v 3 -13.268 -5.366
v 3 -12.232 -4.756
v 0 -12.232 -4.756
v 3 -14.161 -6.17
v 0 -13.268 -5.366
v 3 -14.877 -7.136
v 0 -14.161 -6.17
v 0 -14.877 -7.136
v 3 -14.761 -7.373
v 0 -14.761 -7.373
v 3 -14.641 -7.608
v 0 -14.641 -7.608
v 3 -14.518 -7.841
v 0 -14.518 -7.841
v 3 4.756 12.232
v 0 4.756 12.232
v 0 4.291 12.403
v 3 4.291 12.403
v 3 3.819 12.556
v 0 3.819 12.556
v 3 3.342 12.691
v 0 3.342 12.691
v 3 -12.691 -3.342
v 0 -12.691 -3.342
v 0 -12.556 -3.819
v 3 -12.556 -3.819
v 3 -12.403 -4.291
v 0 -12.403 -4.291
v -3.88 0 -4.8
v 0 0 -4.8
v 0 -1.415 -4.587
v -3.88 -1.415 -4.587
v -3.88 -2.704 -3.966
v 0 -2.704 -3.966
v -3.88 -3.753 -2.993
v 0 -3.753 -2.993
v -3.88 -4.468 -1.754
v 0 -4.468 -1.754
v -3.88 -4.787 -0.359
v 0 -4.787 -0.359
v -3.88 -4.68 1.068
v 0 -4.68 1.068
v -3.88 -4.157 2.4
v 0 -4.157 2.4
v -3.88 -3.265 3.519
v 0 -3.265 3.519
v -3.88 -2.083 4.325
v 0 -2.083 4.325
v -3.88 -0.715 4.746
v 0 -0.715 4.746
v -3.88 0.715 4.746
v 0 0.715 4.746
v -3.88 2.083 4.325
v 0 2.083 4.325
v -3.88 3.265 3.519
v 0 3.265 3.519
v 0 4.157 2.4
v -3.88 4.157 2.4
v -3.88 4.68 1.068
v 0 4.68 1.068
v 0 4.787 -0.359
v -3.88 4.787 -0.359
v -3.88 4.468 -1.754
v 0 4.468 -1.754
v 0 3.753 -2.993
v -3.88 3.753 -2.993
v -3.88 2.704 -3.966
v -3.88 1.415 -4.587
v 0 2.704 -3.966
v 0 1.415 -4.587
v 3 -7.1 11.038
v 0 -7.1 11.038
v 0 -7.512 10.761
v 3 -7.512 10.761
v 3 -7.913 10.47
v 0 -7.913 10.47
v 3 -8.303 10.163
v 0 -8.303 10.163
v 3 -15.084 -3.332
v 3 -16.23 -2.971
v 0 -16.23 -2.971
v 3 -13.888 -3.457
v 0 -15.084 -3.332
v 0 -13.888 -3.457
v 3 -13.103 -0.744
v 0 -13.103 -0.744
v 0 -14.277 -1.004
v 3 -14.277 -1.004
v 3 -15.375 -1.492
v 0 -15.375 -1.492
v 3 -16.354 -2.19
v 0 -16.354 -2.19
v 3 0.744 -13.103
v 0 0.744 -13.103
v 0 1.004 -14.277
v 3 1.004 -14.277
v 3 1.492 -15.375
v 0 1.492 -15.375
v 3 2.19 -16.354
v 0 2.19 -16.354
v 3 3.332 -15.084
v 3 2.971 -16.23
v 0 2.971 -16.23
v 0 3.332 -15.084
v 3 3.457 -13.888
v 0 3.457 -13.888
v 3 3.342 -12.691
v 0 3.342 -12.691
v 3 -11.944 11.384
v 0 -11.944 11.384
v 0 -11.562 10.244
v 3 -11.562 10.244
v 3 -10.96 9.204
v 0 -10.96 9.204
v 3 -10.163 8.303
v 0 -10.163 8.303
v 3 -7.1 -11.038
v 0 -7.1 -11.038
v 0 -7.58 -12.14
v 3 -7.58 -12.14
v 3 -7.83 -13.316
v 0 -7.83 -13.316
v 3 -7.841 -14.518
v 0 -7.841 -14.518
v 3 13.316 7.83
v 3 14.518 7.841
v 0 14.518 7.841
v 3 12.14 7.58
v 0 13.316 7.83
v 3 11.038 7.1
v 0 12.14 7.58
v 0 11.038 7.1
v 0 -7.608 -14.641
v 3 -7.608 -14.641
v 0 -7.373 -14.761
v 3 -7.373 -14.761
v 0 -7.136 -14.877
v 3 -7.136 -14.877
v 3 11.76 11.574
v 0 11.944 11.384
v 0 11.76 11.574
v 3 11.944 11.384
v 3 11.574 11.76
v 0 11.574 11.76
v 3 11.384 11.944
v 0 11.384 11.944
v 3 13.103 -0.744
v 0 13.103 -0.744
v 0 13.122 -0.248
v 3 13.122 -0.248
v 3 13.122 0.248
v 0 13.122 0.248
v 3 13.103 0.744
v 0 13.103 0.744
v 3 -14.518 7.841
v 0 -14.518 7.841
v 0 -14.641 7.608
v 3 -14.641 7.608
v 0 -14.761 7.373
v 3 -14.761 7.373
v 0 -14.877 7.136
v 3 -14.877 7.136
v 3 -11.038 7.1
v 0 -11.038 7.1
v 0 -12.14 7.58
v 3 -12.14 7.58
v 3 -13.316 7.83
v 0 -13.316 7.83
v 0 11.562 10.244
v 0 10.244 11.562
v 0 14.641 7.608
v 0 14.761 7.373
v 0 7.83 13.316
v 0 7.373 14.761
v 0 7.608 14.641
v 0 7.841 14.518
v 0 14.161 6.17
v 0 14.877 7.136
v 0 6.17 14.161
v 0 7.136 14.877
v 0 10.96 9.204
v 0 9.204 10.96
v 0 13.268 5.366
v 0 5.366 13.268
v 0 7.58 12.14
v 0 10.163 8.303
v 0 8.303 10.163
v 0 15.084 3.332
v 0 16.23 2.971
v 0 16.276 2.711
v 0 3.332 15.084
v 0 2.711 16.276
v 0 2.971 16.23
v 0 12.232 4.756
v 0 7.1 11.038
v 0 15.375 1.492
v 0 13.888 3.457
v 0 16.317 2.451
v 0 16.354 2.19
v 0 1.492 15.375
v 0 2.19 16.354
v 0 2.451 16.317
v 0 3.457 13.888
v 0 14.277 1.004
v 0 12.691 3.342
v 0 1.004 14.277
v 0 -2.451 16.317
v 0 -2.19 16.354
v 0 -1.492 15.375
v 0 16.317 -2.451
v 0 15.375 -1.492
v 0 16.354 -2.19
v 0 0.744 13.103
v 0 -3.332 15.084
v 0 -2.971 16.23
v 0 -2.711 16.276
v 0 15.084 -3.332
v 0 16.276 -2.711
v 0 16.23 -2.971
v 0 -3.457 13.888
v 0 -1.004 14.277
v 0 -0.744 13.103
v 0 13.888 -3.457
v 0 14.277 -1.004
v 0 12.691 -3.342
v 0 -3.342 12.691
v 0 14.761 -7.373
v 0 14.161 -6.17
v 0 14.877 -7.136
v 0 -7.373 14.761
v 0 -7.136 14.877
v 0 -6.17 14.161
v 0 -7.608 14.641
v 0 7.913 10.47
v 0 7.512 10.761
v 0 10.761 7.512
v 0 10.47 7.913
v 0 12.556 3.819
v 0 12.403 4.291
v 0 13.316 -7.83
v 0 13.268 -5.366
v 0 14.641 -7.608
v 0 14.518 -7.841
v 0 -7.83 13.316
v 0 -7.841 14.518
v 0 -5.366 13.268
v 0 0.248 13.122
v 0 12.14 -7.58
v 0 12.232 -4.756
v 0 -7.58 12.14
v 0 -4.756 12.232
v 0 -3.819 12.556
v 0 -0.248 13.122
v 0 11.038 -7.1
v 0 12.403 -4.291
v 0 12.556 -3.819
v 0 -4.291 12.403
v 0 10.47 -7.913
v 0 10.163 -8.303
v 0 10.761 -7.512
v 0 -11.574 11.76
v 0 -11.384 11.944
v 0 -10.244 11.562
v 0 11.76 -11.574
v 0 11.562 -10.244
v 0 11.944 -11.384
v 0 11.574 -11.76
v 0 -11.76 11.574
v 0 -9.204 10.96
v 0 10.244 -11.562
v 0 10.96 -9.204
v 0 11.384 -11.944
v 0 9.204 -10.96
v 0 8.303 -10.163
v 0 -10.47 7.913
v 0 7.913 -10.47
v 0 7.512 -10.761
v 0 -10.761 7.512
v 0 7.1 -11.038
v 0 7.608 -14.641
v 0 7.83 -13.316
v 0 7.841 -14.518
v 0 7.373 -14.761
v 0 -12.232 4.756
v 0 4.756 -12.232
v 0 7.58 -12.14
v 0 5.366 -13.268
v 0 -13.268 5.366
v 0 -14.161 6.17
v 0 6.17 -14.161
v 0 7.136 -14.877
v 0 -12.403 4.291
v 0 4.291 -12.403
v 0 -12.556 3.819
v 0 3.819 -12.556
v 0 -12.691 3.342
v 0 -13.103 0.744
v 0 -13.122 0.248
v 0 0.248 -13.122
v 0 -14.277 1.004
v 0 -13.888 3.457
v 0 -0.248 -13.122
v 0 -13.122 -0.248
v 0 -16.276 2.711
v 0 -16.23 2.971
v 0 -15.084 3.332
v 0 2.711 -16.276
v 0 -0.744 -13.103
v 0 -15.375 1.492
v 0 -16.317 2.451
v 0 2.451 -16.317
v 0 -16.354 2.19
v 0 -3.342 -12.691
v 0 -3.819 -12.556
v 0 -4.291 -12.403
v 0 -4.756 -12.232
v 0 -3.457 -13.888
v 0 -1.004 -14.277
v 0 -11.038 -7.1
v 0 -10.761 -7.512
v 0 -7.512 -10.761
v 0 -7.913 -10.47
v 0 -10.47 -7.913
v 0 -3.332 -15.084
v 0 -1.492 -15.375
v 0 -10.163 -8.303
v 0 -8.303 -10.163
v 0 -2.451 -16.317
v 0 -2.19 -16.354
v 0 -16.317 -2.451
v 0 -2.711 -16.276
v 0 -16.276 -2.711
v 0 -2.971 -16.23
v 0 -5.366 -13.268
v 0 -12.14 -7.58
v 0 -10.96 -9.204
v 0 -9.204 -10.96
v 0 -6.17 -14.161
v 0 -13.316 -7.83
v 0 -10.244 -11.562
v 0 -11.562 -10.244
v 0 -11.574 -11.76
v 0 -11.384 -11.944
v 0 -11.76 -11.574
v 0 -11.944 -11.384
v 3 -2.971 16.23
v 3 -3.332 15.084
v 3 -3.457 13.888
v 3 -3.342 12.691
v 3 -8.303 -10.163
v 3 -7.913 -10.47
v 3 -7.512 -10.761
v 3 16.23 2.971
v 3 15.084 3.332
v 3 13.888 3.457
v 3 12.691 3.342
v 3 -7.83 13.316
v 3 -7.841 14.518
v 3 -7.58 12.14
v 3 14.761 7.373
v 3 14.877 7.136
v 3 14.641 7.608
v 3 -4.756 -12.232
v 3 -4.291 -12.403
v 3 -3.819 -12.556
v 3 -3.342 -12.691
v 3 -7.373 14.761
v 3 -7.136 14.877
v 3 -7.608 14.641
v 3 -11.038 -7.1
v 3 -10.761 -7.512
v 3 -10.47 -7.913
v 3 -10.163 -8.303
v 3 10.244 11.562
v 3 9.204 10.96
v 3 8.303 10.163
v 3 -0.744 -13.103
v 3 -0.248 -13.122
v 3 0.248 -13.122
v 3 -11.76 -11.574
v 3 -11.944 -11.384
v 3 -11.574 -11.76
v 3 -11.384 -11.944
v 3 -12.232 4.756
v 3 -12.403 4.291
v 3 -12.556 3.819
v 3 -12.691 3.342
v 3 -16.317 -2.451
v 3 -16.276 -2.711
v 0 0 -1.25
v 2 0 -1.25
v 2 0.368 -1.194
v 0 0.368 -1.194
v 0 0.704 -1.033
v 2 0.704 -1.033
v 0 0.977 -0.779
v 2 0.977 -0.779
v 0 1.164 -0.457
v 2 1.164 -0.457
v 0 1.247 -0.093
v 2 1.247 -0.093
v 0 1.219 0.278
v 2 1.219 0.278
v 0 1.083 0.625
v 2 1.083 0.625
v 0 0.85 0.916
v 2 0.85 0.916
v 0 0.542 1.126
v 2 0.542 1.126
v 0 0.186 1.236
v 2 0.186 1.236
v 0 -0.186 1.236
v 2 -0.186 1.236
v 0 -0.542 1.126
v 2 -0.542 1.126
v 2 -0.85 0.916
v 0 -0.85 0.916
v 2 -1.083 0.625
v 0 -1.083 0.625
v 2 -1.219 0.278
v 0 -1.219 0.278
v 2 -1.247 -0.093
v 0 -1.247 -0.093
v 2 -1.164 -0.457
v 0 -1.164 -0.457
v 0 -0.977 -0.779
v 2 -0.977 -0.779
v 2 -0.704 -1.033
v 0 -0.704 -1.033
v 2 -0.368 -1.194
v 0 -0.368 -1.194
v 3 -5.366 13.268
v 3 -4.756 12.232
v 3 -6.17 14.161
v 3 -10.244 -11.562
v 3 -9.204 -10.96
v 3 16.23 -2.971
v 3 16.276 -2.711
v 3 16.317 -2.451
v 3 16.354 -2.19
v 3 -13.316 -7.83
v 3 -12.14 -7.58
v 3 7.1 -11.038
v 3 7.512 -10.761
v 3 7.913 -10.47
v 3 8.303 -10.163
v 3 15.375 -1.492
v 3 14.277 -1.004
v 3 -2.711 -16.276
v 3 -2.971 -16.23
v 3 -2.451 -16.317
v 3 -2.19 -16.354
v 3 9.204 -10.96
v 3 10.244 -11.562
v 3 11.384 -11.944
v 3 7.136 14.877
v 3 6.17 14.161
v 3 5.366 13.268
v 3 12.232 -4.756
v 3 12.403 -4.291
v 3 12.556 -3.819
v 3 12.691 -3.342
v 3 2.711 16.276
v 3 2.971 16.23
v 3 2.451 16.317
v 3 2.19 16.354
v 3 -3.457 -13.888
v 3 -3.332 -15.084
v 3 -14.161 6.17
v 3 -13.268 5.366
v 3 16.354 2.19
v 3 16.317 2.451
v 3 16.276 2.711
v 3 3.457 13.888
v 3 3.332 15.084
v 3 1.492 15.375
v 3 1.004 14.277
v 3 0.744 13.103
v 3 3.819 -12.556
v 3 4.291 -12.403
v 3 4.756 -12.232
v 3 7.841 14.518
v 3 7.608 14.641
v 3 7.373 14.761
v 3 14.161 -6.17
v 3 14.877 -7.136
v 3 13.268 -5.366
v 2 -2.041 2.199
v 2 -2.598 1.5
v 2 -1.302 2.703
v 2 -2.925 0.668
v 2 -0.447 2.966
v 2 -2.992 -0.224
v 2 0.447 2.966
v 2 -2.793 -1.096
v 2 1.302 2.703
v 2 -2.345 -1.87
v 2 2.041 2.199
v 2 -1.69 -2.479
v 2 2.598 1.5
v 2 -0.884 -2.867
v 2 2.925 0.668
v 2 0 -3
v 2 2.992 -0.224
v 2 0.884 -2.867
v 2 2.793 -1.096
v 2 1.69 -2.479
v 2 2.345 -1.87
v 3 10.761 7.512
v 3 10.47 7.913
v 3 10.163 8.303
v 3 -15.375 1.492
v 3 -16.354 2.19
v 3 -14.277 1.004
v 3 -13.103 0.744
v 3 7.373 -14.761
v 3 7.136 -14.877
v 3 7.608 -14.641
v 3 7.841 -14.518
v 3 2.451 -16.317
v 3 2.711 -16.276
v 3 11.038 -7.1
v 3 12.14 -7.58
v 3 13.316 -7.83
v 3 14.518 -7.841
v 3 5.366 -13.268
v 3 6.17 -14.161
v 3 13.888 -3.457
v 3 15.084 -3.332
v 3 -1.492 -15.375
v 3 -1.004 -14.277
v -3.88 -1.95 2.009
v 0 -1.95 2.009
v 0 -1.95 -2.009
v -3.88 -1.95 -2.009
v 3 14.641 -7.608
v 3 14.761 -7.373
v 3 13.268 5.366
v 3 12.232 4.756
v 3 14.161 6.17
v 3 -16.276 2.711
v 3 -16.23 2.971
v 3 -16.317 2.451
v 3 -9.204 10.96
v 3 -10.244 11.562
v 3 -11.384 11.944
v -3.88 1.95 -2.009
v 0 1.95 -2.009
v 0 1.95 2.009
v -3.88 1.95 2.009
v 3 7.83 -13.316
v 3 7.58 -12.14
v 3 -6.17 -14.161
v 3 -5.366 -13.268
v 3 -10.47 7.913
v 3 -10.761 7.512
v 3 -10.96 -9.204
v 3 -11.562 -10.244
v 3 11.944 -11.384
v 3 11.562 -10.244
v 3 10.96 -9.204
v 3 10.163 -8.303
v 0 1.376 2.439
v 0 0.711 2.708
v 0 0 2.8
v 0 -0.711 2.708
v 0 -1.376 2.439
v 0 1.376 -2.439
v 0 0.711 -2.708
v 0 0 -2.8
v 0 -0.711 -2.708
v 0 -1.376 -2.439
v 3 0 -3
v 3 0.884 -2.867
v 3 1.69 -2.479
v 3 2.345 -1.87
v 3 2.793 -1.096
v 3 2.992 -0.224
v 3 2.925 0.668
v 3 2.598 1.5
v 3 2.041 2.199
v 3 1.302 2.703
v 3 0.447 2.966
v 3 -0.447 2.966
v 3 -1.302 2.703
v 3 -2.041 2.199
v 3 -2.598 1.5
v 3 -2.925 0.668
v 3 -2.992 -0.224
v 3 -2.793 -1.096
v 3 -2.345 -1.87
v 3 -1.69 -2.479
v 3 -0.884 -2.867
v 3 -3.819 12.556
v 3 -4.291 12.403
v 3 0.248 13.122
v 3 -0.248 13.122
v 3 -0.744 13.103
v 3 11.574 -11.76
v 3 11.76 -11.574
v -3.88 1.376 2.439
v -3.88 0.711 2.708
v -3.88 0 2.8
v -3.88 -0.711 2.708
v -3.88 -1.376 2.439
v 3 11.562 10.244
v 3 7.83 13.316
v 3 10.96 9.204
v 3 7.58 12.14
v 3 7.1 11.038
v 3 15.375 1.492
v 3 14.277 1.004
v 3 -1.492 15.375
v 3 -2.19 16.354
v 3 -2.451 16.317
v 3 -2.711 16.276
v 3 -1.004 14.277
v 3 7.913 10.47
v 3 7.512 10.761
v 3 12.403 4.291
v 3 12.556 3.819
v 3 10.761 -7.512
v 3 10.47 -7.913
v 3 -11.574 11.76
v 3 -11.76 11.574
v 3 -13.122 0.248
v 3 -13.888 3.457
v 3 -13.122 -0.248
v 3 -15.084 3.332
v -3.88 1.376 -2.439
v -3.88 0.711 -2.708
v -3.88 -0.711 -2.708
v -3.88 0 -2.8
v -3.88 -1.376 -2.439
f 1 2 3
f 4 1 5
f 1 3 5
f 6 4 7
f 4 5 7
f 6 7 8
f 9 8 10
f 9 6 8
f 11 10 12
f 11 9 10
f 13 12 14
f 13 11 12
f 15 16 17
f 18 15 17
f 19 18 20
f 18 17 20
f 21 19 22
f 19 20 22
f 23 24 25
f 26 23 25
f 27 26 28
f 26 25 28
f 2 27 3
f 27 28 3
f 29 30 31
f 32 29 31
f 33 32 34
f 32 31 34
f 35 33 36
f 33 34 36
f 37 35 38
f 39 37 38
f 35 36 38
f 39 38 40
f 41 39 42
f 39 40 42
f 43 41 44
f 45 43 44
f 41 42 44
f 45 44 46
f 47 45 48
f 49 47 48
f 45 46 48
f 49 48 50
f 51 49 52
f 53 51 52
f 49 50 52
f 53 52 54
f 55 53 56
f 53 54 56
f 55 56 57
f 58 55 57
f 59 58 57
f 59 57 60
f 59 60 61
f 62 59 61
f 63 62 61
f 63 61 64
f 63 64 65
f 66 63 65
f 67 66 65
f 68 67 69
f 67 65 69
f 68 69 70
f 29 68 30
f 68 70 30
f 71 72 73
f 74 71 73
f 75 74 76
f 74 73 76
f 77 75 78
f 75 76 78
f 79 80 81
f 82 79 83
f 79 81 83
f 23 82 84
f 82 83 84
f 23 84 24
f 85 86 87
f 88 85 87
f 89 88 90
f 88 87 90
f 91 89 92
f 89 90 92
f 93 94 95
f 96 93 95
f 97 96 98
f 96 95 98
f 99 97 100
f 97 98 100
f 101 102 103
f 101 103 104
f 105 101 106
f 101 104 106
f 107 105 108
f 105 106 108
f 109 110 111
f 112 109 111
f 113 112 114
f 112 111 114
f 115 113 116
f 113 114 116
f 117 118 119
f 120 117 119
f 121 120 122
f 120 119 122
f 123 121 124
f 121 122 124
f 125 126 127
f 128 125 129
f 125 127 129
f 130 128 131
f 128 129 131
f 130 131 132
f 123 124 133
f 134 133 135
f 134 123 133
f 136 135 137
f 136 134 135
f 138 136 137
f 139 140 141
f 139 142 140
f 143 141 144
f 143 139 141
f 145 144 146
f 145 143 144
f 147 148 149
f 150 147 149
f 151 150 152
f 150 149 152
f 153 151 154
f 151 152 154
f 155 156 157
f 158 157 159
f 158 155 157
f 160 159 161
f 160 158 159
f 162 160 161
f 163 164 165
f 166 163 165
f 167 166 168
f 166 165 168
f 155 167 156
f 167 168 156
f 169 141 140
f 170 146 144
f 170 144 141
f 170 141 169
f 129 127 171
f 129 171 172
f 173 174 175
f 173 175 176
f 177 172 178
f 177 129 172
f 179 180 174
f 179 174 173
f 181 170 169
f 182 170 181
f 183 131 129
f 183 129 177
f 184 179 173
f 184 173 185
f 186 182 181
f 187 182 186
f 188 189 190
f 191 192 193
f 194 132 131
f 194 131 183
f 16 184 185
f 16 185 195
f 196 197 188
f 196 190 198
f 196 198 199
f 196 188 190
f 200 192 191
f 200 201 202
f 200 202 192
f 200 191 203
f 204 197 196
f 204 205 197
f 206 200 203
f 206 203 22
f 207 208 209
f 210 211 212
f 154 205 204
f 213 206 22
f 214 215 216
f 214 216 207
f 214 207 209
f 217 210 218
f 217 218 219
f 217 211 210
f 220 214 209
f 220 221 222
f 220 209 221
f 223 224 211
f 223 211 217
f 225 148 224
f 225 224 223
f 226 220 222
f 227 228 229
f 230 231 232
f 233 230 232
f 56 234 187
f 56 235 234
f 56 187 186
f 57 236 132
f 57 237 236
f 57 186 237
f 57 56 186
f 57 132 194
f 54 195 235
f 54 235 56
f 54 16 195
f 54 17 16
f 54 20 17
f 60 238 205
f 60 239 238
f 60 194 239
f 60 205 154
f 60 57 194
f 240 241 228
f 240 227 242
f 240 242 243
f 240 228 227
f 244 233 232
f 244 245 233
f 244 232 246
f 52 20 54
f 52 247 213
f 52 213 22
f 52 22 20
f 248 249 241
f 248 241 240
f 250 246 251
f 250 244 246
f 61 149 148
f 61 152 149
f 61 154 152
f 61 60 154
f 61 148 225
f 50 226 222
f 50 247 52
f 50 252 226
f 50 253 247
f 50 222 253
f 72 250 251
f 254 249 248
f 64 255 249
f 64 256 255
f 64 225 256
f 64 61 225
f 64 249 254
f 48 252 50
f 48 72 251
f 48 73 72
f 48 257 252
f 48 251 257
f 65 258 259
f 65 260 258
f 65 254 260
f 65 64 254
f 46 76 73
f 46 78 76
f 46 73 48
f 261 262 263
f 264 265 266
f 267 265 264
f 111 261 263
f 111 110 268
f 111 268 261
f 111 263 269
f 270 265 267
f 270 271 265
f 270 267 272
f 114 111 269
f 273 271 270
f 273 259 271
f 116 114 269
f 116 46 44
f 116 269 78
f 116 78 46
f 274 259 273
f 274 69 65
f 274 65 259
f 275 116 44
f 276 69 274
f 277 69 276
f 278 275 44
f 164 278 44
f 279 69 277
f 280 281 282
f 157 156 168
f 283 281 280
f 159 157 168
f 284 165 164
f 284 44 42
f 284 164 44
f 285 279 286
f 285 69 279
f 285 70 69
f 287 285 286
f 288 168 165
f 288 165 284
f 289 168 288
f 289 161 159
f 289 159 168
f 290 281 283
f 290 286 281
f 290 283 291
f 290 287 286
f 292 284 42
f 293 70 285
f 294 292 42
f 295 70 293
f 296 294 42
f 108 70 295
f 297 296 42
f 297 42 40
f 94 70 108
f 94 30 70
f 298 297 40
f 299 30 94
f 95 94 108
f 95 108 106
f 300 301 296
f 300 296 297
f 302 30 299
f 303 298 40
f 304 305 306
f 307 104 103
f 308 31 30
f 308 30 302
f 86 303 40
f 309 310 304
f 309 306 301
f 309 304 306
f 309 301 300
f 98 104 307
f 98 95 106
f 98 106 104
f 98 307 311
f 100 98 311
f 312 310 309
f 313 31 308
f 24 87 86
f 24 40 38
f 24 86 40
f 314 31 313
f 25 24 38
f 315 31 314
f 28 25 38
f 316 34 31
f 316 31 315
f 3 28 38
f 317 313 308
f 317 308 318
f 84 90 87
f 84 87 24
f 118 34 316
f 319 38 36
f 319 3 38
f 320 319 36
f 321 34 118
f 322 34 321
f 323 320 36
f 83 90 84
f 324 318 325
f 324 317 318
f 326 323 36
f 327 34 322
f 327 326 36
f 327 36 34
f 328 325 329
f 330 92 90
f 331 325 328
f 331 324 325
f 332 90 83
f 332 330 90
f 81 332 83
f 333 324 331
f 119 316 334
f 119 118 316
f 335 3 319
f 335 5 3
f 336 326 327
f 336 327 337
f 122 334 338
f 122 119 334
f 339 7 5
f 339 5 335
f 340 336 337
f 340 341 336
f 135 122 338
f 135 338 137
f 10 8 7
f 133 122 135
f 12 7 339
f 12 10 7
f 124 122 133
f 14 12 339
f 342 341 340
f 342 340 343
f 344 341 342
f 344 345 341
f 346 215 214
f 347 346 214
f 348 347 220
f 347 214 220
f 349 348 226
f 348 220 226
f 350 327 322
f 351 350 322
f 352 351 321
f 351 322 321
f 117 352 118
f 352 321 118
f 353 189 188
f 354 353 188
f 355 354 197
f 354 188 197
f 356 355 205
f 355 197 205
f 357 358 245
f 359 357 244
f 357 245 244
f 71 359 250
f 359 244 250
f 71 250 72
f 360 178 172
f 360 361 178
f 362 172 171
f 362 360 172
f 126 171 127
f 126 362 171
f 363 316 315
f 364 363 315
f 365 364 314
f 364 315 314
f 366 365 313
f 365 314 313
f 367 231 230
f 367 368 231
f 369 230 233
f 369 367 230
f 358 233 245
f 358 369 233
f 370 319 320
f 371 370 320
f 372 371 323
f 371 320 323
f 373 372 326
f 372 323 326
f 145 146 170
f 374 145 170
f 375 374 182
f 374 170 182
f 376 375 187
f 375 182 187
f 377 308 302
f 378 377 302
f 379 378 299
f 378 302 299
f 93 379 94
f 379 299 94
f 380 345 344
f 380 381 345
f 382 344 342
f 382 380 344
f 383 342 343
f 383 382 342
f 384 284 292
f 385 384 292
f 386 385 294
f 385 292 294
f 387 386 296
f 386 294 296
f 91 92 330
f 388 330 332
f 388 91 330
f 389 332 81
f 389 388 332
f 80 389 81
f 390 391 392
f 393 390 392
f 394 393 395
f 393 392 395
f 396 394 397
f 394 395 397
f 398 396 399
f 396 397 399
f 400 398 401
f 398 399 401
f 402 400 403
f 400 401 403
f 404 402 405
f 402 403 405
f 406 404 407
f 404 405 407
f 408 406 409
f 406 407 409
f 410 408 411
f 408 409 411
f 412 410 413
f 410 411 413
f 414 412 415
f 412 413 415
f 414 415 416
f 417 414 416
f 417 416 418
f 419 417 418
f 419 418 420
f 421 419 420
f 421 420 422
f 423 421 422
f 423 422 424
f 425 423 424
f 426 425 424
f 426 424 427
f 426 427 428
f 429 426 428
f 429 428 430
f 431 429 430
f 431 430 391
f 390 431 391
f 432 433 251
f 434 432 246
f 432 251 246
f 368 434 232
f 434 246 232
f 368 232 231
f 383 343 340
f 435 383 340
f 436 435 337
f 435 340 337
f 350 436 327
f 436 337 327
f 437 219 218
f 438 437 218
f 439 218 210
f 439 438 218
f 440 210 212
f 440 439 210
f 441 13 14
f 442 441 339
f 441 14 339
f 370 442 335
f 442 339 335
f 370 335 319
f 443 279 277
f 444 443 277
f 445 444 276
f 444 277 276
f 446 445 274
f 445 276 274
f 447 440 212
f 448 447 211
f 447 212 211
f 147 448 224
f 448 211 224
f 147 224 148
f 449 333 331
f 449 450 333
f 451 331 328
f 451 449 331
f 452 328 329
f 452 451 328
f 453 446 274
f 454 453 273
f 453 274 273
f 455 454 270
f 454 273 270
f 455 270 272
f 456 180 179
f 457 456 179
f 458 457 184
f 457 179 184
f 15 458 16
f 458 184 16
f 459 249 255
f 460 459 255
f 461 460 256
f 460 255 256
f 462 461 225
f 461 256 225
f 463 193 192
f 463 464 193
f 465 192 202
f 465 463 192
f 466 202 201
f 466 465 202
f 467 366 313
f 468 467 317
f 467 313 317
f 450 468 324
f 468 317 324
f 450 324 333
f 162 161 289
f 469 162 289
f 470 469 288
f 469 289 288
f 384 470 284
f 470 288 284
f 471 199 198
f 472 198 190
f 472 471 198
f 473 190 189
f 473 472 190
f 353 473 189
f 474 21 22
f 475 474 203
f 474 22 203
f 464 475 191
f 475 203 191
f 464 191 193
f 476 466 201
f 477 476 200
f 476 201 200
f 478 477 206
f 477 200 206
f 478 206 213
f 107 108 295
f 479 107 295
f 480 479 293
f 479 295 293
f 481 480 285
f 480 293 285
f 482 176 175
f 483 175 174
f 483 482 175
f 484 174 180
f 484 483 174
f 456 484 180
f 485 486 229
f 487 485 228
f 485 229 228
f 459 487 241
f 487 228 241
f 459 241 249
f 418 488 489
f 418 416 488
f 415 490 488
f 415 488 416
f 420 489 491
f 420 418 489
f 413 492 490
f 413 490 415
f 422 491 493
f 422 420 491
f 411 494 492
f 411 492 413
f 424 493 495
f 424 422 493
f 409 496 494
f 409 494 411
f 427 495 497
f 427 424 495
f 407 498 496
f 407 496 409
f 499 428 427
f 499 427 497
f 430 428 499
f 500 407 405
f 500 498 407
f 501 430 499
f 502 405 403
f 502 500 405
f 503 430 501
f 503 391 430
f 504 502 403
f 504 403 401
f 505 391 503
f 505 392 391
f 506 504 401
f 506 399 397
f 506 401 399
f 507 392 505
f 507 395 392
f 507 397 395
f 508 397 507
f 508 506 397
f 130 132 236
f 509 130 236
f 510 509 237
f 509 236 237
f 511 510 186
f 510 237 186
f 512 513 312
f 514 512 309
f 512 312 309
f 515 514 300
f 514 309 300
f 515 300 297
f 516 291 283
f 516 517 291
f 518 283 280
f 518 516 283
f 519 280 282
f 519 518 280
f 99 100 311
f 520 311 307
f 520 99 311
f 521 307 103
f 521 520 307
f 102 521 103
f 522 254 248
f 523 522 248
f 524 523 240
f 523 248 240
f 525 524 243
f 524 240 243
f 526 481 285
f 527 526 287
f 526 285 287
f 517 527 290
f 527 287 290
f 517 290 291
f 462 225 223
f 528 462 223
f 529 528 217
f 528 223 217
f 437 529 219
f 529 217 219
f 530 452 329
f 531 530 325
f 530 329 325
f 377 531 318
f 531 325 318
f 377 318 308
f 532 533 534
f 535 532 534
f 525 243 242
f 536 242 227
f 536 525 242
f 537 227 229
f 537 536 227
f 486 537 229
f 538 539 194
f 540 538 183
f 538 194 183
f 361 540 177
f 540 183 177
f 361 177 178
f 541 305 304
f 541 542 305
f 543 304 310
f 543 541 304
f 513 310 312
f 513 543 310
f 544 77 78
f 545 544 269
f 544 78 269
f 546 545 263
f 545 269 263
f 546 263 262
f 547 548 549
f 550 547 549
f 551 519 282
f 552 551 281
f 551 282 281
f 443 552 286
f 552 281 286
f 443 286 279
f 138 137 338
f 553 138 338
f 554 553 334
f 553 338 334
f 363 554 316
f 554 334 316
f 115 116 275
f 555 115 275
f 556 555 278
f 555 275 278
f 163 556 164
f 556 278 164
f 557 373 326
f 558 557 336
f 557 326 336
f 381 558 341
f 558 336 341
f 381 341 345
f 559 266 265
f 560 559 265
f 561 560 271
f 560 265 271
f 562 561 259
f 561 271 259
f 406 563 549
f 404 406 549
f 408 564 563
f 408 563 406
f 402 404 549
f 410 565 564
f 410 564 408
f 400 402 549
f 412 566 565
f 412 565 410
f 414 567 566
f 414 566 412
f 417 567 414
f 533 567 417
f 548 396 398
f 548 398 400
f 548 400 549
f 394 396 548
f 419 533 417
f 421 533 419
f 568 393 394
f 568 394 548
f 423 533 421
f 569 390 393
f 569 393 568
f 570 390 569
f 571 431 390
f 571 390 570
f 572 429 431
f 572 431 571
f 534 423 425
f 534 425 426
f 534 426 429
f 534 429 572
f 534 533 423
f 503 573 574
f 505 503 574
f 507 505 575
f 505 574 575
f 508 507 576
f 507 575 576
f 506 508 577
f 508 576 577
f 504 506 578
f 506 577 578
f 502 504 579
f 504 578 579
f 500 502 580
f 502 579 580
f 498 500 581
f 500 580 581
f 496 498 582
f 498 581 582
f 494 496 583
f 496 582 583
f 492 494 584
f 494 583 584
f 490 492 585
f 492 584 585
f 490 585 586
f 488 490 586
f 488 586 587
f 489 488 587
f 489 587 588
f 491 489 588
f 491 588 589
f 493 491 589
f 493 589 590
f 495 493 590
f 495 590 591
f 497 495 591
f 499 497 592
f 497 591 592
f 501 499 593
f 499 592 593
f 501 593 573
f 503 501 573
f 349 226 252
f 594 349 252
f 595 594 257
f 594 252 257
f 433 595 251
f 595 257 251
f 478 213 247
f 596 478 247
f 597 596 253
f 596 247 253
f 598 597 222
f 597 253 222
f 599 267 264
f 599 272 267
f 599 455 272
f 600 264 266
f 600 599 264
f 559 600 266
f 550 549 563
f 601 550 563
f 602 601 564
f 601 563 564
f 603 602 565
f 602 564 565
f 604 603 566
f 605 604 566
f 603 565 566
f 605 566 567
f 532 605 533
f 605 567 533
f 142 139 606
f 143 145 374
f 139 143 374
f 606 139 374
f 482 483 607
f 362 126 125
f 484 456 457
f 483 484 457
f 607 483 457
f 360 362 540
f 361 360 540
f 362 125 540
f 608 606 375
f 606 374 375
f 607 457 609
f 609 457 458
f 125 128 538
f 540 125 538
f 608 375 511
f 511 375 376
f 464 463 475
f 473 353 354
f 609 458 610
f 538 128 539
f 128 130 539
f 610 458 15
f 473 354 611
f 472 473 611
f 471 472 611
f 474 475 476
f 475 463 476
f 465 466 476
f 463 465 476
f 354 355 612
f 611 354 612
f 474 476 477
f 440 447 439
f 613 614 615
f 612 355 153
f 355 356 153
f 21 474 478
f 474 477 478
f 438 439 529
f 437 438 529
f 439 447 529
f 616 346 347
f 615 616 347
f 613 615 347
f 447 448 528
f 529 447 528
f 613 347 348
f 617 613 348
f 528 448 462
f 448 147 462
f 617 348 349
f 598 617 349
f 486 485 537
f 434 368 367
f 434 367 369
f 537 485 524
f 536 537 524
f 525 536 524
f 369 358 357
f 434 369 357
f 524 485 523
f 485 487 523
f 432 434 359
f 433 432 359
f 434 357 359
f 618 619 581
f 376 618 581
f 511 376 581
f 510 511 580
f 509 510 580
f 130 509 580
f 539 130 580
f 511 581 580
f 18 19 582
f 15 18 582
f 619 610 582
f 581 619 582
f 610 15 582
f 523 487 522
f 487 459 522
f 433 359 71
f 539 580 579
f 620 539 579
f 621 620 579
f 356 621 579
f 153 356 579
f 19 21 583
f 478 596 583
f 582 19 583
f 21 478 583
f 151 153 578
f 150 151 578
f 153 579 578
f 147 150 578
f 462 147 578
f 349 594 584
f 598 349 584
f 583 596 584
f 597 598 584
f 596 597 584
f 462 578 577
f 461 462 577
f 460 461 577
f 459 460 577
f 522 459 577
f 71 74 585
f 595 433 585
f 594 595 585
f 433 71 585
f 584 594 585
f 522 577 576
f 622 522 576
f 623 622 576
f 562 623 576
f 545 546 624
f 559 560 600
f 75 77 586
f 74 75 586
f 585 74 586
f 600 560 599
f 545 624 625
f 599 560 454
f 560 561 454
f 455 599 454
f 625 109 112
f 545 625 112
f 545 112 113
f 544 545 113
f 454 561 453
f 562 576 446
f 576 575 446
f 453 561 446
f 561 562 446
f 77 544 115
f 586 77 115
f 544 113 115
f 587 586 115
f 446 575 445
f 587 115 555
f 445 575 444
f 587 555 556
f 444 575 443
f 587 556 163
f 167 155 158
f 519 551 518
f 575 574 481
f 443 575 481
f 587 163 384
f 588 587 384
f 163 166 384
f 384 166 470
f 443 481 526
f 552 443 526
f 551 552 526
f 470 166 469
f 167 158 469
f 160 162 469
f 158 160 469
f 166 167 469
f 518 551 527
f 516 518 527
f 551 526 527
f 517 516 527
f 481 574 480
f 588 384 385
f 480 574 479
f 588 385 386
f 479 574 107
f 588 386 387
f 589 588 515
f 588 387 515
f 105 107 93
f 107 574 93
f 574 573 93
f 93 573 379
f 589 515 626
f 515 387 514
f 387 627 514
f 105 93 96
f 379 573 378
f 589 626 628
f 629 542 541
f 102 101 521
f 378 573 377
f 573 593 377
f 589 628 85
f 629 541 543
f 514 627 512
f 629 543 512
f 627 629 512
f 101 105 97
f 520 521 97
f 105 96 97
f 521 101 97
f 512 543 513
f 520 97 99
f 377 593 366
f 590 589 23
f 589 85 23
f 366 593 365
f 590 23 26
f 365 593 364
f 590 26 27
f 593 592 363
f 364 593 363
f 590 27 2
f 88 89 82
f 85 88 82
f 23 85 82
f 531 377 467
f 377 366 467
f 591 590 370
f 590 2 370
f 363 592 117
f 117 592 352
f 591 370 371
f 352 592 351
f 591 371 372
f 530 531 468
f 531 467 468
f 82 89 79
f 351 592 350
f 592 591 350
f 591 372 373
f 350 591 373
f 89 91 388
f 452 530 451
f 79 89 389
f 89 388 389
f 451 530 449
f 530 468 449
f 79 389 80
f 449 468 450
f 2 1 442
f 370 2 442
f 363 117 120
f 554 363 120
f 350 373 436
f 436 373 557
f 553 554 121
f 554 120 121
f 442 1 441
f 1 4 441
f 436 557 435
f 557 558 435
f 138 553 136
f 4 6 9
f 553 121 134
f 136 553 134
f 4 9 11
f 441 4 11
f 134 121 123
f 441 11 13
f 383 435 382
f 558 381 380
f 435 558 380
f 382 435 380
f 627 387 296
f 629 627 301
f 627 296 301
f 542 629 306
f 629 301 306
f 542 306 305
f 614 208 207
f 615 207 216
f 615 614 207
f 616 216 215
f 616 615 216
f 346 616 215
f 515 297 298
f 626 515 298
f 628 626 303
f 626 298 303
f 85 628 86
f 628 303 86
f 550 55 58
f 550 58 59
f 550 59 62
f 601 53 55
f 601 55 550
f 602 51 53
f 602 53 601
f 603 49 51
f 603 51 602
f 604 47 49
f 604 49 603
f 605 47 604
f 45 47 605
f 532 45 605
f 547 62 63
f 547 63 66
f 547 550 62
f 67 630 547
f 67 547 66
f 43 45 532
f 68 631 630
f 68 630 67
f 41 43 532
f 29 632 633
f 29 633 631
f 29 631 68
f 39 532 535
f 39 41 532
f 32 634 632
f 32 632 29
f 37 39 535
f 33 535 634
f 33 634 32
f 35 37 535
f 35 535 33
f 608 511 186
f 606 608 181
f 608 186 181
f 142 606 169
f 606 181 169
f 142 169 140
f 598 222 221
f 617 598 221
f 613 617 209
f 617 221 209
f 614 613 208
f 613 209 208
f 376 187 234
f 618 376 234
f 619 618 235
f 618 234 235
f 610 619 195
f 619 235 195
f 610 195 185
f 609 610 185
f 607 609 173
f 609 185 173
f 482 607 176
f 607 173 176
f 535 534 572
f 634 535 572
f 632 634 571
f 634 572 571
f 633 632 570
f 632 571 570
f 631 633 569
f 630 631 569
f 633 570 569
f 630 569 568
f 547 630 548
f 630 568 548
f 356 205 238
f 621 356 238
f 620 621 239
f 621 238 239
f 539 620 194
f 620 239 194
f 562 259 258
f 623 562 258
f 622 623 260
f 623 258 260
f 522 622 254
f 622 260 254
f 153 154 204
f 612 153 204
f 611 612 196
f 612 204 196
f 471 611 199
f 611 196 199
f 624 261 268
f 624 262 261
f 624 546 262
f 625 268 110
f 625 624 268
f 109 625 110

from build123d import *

# Parameters (mm, degrees)
BASPROSKE_W         = 3
BASPROSKE_H         = 16.5
TOOTHCUT_DEPTH      = 24.526580712
TEETHCUTS_COUNT     = 20
TEETHCUTS_ANGLE     = 342
BORSKE_R            = 0.5
BORE_DEPTH          = 50.0000508
SKETCH1_R           = 4.8
BOSS_EXTRUDE1_DEPTH = 3.88
CUT_EXTRUDE1_REACH  = 26.13
SKETCH2_R           = 1.25
SKETCH3_R           = 3
SKETCH3_R_2         = 1.25
CUT_EXTRUDE2_DEPTH  = 1


with BuildPart() as part:
    # BasProSke → Base-Revolve (revolve)
    with BuildSketch(Plane(origin=(0, 0, 0), x_dir=(1, 0, 0), z_dir=(0, 1, 0)), mode=Mode.PRIVATE) as base_revolve_sk:
        with Locations((1.5, 8.25)):
            Rectangle(BASPROSKE_W, BASPROSKE_H)
    revolve(base_revolve_sk.sketch.rotate(Axis((-10, 0, 0), (1, 0, 0)), 180), axis=Axis((-10, 0, 0), (1, 0, 0)))

    # TooCutSke → ToothCut (cut, through all)
    with BuildSketch(Plane(origin=(0, 0, 0), x_dir=(0, 0, -1), z_dir=(1, 0, 0))):
        with BuildLine():
            ThreePointArc((0.74381438, 13.102904875), (0, 13.124), (-0.74381438, 13.102904875))
            ThreePointArc((-0.74381438, 13.102904875), (-1.226473103, 14.852072512), (-2.209965745, 16.376962373))
            ThreePointArc((-2.209965745, 16.376962373), (0, 16.5254), (2.209965745, 16.376962373))
            ThreePointArc((2.209965745, 16.376962373), (1.226473103, 14.852072512), (0.74381438, 13.102904875))
        make_face()
    toothcut = extrude(amount=TOOTHCUT_DEPTH, mode=Mode.SUBTRACT)

    # TeethCuts: ToothCut ×20 about axis
    teethcuts_axis = Axis((-10, 0, 0), (1, 0, 0))
    for i in range(1, TEETHCUTS_COUNT):
        add(toothcut.rotate(teethcuts_axis, i * TEETHCUTS_ANGLE / (TEETHCUTS_COUNT - 1)), mode=Mode.SUBTRACT)

    # BorSke → Bore (cut, symmetric)
    with BuildSketch(Plane(origin=(0, 0, 0), x_dir=(0, 0, -1), z_dir=(1, 0, 0))):
        with Locations(Location((0, 0, 0), (0, 0, 180))):
            Circle(BORSKE_R)
    extrude(amount=BORE_DEPTH, both=True, mode=Mode.SUBTRACT)

    # Sketch1 → Boss-Extrude1 (add)
    with BuildSketch(Plane.ZY):
        with Locations(Location((0, 0, 0), (0, 0, 180))):
            Circle(SKETCH1_R)
        with BuildLine():
            Line((-2.00935313, 1.95), (2.00935313, 1.95))
            ThreePointArc((2.00935313, 1.95), (2.8, 0), (2.00935313, -1.95))
            Line((2.00935313, -1.95), (-2.00935313, -1.95))
            ThreePointArc((-2.00935313, -1.95), (-2.8, 0), (-2.00935313, 1.95))
        make_face(mode=Mode.SUBTRACT)
    extrude(amount=BOSS_EXTRUDE1_DEPTH)

    # Sketch2 → Cut-Extrude1 (cut, up to next)
    with BuildSketch(Plane(origin=(3, 0, 0), x_dir=(0, 0, -1), z_dir=(1, 0, 0)), mode=Mode.PRIVATE) as cut_extrude1_sk1:
        Circle(SKETCH2_R)
    cut_extrude1_tool1 = extrude(cut_extrude1_sk1.sketch, amount=-CUT_EXTRUDE1_REACH, mode=Mode.PRIVATE) & part.part
    add(cut_extrude1_tool1.solids().sort_by_distance((3, 0, 0))[0], mode=Mode.SUBTRACT)

    # Sketch3 → Cut-Extrude2 (cut)
    with BuildSketch(Plane(origin=(3, 0, 0), x_dir=(0, 0, -1), z_dir=(1, 0, 0))):
        Circle(SKETCH3_R)
        Circle(SKETCH3_R_2, mode=Mode.SUBTRACT)
    extrude(amount=-CUT_EXTRUDE2_DEPTH, mode=Mode.SUBTRACT)


solid = part.part
